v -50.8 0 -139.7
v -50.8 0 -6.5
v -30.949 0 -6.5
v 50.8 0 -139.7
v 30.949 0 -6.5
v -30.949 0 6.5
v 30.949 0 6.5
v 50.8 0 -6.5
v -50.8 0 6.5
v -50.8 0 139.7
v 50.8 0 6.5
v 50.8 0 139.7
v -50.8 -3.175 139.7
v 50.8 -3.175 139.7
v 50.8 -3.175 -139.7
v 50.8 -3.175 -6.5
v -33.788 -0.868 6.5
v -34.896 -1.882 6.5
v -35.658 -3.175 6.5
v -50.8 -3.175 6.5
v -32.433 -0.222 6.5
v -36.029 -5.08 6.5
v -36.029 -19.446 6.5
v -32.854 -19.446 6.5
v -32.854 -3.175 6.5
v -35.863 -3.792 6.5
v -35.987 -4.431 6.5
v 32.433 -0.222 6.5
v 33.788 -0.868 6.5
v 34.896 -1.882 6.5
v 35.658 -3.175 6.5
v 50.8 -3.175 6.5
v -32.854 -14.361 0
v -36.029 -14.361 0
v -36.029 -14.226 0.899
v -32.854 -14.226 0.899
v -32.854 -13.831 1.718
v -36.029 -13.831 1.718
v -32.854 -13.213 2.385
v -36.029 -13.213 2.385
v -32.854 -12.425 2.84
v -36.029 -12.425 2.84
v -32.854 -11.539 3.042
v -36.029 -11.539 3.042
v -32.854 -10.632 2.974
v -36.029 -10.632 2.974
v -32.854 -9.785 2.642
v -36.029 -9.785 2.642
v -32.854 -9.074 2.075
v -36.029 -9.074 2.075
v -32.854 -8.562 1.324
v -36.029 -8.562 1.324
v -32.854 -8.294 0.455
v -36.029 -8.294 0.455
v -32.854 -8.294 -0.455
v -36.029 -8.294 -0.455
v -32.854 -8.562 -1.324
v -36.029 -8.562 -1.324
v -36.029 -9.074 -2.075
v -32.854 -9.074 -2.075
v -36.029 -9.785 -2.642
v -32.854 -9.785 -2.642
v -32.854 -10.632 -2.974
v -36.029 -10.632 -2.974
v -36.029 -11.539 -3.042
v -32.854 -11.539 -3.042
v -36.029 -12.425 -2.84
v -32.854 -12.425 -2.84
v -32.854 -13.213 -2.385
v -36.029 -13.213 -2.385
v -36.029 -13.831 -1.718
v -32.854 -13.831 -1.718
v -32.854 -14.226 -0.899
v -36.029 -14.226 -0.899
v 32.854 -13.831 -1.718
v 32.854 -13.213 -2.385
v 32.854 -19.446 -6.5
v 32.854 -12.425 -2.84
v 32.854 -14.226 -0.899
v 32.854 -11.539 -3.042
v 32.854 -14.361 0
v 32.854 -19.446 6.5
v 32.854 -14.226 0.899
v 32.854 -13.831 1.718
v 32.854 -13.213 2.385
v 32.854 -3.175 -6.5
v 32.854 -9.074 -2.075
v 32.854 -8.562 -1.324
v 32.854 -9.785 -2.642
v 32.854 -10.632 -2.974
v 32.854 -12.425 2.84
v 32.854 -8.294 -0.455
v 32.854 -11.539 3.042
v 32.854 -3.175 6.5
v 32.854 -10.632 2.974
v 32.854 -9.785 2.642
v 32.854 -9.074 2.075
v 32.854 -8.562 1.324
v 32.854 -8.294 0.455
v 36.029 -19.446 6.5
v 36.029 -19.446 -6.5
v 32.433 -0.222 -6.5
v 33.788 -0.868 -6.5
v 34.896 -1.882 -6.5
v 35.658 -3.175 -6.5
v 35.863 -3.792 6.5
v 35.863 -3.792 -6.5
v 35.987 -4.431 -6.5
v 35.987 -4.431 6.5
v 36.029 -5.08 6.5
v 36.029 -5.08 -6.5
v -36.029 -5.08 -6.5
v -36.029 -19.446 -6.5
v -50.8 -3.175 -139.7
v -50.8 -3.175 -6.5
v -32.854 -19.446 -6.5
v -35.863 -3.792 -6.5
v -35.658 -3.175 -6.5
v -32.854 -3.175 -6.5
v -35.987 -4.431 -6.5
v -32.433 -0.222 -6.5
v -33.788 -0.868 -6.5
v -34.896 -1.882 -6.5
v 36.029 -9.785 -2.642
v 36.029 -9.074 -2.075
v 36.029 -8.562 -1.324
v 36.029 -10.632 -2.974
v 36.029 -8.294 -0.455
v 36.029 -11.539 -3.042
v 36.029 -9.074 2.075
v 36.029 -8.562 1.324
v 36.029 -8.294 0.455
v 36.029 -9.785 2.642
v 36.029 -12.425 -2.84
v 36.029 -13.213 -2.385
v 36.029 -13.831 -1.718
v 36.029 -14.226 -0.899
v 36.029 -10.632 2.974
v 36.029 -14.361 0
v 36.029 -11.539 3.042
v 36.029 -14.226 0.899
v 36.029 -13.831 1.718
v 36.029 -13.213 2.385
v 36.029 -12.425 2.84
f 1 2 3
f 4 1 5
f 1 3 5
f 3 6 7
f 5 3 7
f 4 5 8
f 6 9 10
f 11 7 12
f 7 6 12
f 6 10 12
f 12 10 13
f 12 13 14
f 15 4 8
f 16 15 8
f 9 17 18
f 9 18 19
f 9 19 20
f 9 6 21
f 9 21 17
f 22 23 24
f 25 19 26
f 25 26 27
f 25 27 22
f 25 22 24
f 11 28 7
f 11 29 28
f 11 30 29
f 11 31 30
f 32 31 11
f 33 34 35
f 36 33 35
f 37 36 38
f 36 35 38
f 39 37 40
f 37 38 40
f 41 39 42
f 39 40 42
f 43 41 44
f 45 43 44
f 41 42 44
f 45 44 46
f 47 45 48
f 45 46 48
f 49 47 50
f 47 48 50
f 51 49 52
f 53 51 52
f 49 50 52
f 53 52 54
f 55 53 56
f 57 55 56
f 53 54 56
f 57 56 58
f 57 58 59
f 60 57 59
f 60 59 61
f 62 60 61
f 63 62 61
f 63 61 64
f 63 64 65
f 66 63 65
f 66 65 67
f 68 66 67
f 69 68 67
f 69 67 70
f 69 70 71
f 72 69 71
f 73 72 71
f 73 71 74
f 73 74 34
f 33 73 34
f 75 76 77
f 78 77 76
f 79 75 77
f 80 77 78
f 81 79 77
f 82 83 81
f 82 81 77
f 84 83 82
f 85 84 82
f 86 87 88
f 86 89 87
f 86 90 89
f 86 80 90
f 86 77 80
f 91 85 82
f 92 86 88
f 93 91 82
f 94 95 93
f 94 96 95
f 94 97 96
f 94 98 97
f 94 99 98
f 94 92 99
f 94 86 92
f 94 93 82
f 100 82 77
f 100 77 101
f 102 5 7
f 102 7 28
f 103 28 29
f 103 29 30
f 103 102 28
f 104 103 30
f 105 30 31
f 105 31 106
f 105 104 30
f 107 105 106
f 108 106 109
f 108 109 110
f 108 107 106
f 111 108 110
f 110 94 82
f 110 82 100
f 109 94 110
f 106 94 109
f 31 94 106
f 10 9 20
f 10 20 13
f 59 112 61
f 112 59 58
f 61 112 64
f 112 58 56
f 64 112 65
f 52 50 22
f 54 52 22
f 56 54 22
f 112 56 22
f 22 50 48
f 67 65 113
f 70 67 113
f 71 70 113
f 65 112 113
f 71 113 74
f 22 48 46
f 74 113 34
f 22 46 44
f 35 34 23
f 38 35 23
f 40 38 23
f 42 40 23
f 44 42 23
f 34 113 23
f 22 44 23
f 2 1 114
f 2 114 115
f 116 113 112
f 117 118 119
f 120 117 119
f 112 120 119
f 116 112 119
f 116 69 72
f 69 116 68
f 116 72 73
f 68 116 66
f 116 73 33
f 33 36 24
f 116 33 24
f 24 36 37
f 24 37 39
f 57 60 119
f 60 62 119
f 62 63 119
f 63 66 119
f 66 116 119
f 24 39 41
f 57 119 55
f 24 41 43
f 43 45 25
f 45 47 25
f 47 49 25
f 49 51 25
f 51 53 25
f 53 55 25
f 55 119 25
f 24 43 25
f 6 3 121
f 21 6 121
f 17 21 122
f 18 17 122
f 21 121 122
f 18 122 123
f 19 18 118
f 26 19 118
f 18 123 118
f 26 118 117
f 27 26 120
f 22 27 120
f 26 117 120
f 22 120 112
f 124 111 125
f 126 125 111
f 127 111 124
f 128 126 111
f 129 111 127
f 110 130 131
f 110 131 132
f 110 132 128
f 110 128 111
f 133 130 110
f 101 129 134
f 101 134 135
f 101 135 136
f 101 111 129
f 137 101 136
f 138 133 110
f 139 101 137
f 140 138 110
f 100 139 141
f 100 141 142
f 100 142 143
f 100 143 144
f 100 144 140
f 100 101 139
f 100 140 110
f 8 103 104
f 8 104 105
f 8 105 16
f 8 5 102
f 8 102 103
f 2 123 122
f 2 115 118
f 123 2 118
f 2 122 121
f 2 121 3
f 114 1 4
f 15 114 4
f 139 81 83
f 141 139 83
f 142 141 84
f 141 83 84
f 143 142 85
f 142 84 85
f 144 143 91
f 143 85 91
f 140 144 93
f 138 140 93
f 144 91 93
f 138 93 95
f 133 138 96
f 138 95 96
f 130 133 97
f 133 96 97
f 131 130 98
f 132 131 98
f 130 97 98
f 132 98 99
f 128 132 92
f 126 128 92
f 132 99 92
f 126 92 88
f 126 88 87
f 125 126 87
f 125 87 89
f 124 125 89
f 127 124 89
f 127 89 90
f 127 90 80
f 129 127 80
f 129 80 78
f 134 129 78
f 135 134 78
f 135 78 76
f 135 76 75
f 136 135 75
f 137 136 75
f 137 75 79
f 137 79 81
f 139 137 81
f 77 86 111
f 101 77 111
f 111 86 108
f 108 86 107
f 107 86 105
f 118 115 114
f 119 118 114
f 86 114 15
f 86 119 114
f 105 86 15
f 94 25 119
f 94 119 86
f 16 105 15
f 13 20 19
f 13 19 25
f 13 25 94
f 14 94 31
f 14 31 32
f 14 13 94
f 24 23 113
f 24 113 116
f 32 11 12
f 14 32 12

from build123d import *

# Parameters (mm, degrees)
F0_W        = 101.6
F0_H        = 279.4
F1_DEPTH    = 3.175
F2_W        = 3.175
F2_H        = 12.99972
F3_DEPTH    = 16.27124
F2_W_2      = 14.77137
F4_DEPTH    = 25.4
F5_T1_DEPTH = 12.99972
F7_D        = 6.10108


# Not quite as in the source:
# - a fillet or chamfer that OpenCascade refuses, or shapes differently, is made with other operations: its cross-section is extruded or revolved along the edge and cut away or added


with BuildPart() as f1:
    # F0 (on Front) → F1 (new body)
    with BuildSketch(Plane.XZ):
        Rectangle(F0_W, F0_H)
    extrude(amount=F1_DEPTH)

    # F2 (on face) → F3 (join)
    with BuildSketch(Plane.XZ.offset(3.175)):
        with Locations((34.44113, 0)):
            Rectangle(F2_W, F2_H)
        with Locations((-34.44113, 0)):
            Rectangle(F2_W, F2_H)
    extrude(amount=F3_DEPTH)

    # F2 (on face) → F4 (cut)
    with BuildSketch(Plane.XZ.offset(3.175)):
        with Locations((43.414315, 0)):
            Rectangle(F2_W_2, F2_H)
        with Locations((-43.414315, 0)):
            Rectangle(F2_W_2, F2_H)
    extrude(amount=-F4_DEPTH, mode=Mode.SUBTRACT)

    # F5: fillet of radius 5.08 on 2 edges, made by hand

    # F5_s2 → F5_t1 (cut)
    with BuildSketch(Plane.XY.offset(-6.49986)):
        with BuildLine():
            ThreePointArc((30.94863, 0), (34.5407324484, -1.4878975516), (36.02863, -5.08))
            Line((36.02863, -5.08), (36.02863, 0))
            Line((36.02863, 0), (30.94863, 0))
        make_face()
        with BuildLine():
            ThreePointArc((-30.94863, 0), (-34.5407324484, -1.4878975516), (-36.02863, -5.08))
            Line((-36.02863, -5.08), (-36.02863, 0))
            Line((-36.02863, 0), (-30.94863, 0))
        make_face()
    extrude(amount=F5_T1_DEPTH, mode=Mode.SUBTRACT)

    # F7 (through all)
    with Locations(Plane.YZ.offset(36.02863)):
        with Locations((-11.31062, 0)):
            Hole(F7_D / 2)


solid = f1.part
